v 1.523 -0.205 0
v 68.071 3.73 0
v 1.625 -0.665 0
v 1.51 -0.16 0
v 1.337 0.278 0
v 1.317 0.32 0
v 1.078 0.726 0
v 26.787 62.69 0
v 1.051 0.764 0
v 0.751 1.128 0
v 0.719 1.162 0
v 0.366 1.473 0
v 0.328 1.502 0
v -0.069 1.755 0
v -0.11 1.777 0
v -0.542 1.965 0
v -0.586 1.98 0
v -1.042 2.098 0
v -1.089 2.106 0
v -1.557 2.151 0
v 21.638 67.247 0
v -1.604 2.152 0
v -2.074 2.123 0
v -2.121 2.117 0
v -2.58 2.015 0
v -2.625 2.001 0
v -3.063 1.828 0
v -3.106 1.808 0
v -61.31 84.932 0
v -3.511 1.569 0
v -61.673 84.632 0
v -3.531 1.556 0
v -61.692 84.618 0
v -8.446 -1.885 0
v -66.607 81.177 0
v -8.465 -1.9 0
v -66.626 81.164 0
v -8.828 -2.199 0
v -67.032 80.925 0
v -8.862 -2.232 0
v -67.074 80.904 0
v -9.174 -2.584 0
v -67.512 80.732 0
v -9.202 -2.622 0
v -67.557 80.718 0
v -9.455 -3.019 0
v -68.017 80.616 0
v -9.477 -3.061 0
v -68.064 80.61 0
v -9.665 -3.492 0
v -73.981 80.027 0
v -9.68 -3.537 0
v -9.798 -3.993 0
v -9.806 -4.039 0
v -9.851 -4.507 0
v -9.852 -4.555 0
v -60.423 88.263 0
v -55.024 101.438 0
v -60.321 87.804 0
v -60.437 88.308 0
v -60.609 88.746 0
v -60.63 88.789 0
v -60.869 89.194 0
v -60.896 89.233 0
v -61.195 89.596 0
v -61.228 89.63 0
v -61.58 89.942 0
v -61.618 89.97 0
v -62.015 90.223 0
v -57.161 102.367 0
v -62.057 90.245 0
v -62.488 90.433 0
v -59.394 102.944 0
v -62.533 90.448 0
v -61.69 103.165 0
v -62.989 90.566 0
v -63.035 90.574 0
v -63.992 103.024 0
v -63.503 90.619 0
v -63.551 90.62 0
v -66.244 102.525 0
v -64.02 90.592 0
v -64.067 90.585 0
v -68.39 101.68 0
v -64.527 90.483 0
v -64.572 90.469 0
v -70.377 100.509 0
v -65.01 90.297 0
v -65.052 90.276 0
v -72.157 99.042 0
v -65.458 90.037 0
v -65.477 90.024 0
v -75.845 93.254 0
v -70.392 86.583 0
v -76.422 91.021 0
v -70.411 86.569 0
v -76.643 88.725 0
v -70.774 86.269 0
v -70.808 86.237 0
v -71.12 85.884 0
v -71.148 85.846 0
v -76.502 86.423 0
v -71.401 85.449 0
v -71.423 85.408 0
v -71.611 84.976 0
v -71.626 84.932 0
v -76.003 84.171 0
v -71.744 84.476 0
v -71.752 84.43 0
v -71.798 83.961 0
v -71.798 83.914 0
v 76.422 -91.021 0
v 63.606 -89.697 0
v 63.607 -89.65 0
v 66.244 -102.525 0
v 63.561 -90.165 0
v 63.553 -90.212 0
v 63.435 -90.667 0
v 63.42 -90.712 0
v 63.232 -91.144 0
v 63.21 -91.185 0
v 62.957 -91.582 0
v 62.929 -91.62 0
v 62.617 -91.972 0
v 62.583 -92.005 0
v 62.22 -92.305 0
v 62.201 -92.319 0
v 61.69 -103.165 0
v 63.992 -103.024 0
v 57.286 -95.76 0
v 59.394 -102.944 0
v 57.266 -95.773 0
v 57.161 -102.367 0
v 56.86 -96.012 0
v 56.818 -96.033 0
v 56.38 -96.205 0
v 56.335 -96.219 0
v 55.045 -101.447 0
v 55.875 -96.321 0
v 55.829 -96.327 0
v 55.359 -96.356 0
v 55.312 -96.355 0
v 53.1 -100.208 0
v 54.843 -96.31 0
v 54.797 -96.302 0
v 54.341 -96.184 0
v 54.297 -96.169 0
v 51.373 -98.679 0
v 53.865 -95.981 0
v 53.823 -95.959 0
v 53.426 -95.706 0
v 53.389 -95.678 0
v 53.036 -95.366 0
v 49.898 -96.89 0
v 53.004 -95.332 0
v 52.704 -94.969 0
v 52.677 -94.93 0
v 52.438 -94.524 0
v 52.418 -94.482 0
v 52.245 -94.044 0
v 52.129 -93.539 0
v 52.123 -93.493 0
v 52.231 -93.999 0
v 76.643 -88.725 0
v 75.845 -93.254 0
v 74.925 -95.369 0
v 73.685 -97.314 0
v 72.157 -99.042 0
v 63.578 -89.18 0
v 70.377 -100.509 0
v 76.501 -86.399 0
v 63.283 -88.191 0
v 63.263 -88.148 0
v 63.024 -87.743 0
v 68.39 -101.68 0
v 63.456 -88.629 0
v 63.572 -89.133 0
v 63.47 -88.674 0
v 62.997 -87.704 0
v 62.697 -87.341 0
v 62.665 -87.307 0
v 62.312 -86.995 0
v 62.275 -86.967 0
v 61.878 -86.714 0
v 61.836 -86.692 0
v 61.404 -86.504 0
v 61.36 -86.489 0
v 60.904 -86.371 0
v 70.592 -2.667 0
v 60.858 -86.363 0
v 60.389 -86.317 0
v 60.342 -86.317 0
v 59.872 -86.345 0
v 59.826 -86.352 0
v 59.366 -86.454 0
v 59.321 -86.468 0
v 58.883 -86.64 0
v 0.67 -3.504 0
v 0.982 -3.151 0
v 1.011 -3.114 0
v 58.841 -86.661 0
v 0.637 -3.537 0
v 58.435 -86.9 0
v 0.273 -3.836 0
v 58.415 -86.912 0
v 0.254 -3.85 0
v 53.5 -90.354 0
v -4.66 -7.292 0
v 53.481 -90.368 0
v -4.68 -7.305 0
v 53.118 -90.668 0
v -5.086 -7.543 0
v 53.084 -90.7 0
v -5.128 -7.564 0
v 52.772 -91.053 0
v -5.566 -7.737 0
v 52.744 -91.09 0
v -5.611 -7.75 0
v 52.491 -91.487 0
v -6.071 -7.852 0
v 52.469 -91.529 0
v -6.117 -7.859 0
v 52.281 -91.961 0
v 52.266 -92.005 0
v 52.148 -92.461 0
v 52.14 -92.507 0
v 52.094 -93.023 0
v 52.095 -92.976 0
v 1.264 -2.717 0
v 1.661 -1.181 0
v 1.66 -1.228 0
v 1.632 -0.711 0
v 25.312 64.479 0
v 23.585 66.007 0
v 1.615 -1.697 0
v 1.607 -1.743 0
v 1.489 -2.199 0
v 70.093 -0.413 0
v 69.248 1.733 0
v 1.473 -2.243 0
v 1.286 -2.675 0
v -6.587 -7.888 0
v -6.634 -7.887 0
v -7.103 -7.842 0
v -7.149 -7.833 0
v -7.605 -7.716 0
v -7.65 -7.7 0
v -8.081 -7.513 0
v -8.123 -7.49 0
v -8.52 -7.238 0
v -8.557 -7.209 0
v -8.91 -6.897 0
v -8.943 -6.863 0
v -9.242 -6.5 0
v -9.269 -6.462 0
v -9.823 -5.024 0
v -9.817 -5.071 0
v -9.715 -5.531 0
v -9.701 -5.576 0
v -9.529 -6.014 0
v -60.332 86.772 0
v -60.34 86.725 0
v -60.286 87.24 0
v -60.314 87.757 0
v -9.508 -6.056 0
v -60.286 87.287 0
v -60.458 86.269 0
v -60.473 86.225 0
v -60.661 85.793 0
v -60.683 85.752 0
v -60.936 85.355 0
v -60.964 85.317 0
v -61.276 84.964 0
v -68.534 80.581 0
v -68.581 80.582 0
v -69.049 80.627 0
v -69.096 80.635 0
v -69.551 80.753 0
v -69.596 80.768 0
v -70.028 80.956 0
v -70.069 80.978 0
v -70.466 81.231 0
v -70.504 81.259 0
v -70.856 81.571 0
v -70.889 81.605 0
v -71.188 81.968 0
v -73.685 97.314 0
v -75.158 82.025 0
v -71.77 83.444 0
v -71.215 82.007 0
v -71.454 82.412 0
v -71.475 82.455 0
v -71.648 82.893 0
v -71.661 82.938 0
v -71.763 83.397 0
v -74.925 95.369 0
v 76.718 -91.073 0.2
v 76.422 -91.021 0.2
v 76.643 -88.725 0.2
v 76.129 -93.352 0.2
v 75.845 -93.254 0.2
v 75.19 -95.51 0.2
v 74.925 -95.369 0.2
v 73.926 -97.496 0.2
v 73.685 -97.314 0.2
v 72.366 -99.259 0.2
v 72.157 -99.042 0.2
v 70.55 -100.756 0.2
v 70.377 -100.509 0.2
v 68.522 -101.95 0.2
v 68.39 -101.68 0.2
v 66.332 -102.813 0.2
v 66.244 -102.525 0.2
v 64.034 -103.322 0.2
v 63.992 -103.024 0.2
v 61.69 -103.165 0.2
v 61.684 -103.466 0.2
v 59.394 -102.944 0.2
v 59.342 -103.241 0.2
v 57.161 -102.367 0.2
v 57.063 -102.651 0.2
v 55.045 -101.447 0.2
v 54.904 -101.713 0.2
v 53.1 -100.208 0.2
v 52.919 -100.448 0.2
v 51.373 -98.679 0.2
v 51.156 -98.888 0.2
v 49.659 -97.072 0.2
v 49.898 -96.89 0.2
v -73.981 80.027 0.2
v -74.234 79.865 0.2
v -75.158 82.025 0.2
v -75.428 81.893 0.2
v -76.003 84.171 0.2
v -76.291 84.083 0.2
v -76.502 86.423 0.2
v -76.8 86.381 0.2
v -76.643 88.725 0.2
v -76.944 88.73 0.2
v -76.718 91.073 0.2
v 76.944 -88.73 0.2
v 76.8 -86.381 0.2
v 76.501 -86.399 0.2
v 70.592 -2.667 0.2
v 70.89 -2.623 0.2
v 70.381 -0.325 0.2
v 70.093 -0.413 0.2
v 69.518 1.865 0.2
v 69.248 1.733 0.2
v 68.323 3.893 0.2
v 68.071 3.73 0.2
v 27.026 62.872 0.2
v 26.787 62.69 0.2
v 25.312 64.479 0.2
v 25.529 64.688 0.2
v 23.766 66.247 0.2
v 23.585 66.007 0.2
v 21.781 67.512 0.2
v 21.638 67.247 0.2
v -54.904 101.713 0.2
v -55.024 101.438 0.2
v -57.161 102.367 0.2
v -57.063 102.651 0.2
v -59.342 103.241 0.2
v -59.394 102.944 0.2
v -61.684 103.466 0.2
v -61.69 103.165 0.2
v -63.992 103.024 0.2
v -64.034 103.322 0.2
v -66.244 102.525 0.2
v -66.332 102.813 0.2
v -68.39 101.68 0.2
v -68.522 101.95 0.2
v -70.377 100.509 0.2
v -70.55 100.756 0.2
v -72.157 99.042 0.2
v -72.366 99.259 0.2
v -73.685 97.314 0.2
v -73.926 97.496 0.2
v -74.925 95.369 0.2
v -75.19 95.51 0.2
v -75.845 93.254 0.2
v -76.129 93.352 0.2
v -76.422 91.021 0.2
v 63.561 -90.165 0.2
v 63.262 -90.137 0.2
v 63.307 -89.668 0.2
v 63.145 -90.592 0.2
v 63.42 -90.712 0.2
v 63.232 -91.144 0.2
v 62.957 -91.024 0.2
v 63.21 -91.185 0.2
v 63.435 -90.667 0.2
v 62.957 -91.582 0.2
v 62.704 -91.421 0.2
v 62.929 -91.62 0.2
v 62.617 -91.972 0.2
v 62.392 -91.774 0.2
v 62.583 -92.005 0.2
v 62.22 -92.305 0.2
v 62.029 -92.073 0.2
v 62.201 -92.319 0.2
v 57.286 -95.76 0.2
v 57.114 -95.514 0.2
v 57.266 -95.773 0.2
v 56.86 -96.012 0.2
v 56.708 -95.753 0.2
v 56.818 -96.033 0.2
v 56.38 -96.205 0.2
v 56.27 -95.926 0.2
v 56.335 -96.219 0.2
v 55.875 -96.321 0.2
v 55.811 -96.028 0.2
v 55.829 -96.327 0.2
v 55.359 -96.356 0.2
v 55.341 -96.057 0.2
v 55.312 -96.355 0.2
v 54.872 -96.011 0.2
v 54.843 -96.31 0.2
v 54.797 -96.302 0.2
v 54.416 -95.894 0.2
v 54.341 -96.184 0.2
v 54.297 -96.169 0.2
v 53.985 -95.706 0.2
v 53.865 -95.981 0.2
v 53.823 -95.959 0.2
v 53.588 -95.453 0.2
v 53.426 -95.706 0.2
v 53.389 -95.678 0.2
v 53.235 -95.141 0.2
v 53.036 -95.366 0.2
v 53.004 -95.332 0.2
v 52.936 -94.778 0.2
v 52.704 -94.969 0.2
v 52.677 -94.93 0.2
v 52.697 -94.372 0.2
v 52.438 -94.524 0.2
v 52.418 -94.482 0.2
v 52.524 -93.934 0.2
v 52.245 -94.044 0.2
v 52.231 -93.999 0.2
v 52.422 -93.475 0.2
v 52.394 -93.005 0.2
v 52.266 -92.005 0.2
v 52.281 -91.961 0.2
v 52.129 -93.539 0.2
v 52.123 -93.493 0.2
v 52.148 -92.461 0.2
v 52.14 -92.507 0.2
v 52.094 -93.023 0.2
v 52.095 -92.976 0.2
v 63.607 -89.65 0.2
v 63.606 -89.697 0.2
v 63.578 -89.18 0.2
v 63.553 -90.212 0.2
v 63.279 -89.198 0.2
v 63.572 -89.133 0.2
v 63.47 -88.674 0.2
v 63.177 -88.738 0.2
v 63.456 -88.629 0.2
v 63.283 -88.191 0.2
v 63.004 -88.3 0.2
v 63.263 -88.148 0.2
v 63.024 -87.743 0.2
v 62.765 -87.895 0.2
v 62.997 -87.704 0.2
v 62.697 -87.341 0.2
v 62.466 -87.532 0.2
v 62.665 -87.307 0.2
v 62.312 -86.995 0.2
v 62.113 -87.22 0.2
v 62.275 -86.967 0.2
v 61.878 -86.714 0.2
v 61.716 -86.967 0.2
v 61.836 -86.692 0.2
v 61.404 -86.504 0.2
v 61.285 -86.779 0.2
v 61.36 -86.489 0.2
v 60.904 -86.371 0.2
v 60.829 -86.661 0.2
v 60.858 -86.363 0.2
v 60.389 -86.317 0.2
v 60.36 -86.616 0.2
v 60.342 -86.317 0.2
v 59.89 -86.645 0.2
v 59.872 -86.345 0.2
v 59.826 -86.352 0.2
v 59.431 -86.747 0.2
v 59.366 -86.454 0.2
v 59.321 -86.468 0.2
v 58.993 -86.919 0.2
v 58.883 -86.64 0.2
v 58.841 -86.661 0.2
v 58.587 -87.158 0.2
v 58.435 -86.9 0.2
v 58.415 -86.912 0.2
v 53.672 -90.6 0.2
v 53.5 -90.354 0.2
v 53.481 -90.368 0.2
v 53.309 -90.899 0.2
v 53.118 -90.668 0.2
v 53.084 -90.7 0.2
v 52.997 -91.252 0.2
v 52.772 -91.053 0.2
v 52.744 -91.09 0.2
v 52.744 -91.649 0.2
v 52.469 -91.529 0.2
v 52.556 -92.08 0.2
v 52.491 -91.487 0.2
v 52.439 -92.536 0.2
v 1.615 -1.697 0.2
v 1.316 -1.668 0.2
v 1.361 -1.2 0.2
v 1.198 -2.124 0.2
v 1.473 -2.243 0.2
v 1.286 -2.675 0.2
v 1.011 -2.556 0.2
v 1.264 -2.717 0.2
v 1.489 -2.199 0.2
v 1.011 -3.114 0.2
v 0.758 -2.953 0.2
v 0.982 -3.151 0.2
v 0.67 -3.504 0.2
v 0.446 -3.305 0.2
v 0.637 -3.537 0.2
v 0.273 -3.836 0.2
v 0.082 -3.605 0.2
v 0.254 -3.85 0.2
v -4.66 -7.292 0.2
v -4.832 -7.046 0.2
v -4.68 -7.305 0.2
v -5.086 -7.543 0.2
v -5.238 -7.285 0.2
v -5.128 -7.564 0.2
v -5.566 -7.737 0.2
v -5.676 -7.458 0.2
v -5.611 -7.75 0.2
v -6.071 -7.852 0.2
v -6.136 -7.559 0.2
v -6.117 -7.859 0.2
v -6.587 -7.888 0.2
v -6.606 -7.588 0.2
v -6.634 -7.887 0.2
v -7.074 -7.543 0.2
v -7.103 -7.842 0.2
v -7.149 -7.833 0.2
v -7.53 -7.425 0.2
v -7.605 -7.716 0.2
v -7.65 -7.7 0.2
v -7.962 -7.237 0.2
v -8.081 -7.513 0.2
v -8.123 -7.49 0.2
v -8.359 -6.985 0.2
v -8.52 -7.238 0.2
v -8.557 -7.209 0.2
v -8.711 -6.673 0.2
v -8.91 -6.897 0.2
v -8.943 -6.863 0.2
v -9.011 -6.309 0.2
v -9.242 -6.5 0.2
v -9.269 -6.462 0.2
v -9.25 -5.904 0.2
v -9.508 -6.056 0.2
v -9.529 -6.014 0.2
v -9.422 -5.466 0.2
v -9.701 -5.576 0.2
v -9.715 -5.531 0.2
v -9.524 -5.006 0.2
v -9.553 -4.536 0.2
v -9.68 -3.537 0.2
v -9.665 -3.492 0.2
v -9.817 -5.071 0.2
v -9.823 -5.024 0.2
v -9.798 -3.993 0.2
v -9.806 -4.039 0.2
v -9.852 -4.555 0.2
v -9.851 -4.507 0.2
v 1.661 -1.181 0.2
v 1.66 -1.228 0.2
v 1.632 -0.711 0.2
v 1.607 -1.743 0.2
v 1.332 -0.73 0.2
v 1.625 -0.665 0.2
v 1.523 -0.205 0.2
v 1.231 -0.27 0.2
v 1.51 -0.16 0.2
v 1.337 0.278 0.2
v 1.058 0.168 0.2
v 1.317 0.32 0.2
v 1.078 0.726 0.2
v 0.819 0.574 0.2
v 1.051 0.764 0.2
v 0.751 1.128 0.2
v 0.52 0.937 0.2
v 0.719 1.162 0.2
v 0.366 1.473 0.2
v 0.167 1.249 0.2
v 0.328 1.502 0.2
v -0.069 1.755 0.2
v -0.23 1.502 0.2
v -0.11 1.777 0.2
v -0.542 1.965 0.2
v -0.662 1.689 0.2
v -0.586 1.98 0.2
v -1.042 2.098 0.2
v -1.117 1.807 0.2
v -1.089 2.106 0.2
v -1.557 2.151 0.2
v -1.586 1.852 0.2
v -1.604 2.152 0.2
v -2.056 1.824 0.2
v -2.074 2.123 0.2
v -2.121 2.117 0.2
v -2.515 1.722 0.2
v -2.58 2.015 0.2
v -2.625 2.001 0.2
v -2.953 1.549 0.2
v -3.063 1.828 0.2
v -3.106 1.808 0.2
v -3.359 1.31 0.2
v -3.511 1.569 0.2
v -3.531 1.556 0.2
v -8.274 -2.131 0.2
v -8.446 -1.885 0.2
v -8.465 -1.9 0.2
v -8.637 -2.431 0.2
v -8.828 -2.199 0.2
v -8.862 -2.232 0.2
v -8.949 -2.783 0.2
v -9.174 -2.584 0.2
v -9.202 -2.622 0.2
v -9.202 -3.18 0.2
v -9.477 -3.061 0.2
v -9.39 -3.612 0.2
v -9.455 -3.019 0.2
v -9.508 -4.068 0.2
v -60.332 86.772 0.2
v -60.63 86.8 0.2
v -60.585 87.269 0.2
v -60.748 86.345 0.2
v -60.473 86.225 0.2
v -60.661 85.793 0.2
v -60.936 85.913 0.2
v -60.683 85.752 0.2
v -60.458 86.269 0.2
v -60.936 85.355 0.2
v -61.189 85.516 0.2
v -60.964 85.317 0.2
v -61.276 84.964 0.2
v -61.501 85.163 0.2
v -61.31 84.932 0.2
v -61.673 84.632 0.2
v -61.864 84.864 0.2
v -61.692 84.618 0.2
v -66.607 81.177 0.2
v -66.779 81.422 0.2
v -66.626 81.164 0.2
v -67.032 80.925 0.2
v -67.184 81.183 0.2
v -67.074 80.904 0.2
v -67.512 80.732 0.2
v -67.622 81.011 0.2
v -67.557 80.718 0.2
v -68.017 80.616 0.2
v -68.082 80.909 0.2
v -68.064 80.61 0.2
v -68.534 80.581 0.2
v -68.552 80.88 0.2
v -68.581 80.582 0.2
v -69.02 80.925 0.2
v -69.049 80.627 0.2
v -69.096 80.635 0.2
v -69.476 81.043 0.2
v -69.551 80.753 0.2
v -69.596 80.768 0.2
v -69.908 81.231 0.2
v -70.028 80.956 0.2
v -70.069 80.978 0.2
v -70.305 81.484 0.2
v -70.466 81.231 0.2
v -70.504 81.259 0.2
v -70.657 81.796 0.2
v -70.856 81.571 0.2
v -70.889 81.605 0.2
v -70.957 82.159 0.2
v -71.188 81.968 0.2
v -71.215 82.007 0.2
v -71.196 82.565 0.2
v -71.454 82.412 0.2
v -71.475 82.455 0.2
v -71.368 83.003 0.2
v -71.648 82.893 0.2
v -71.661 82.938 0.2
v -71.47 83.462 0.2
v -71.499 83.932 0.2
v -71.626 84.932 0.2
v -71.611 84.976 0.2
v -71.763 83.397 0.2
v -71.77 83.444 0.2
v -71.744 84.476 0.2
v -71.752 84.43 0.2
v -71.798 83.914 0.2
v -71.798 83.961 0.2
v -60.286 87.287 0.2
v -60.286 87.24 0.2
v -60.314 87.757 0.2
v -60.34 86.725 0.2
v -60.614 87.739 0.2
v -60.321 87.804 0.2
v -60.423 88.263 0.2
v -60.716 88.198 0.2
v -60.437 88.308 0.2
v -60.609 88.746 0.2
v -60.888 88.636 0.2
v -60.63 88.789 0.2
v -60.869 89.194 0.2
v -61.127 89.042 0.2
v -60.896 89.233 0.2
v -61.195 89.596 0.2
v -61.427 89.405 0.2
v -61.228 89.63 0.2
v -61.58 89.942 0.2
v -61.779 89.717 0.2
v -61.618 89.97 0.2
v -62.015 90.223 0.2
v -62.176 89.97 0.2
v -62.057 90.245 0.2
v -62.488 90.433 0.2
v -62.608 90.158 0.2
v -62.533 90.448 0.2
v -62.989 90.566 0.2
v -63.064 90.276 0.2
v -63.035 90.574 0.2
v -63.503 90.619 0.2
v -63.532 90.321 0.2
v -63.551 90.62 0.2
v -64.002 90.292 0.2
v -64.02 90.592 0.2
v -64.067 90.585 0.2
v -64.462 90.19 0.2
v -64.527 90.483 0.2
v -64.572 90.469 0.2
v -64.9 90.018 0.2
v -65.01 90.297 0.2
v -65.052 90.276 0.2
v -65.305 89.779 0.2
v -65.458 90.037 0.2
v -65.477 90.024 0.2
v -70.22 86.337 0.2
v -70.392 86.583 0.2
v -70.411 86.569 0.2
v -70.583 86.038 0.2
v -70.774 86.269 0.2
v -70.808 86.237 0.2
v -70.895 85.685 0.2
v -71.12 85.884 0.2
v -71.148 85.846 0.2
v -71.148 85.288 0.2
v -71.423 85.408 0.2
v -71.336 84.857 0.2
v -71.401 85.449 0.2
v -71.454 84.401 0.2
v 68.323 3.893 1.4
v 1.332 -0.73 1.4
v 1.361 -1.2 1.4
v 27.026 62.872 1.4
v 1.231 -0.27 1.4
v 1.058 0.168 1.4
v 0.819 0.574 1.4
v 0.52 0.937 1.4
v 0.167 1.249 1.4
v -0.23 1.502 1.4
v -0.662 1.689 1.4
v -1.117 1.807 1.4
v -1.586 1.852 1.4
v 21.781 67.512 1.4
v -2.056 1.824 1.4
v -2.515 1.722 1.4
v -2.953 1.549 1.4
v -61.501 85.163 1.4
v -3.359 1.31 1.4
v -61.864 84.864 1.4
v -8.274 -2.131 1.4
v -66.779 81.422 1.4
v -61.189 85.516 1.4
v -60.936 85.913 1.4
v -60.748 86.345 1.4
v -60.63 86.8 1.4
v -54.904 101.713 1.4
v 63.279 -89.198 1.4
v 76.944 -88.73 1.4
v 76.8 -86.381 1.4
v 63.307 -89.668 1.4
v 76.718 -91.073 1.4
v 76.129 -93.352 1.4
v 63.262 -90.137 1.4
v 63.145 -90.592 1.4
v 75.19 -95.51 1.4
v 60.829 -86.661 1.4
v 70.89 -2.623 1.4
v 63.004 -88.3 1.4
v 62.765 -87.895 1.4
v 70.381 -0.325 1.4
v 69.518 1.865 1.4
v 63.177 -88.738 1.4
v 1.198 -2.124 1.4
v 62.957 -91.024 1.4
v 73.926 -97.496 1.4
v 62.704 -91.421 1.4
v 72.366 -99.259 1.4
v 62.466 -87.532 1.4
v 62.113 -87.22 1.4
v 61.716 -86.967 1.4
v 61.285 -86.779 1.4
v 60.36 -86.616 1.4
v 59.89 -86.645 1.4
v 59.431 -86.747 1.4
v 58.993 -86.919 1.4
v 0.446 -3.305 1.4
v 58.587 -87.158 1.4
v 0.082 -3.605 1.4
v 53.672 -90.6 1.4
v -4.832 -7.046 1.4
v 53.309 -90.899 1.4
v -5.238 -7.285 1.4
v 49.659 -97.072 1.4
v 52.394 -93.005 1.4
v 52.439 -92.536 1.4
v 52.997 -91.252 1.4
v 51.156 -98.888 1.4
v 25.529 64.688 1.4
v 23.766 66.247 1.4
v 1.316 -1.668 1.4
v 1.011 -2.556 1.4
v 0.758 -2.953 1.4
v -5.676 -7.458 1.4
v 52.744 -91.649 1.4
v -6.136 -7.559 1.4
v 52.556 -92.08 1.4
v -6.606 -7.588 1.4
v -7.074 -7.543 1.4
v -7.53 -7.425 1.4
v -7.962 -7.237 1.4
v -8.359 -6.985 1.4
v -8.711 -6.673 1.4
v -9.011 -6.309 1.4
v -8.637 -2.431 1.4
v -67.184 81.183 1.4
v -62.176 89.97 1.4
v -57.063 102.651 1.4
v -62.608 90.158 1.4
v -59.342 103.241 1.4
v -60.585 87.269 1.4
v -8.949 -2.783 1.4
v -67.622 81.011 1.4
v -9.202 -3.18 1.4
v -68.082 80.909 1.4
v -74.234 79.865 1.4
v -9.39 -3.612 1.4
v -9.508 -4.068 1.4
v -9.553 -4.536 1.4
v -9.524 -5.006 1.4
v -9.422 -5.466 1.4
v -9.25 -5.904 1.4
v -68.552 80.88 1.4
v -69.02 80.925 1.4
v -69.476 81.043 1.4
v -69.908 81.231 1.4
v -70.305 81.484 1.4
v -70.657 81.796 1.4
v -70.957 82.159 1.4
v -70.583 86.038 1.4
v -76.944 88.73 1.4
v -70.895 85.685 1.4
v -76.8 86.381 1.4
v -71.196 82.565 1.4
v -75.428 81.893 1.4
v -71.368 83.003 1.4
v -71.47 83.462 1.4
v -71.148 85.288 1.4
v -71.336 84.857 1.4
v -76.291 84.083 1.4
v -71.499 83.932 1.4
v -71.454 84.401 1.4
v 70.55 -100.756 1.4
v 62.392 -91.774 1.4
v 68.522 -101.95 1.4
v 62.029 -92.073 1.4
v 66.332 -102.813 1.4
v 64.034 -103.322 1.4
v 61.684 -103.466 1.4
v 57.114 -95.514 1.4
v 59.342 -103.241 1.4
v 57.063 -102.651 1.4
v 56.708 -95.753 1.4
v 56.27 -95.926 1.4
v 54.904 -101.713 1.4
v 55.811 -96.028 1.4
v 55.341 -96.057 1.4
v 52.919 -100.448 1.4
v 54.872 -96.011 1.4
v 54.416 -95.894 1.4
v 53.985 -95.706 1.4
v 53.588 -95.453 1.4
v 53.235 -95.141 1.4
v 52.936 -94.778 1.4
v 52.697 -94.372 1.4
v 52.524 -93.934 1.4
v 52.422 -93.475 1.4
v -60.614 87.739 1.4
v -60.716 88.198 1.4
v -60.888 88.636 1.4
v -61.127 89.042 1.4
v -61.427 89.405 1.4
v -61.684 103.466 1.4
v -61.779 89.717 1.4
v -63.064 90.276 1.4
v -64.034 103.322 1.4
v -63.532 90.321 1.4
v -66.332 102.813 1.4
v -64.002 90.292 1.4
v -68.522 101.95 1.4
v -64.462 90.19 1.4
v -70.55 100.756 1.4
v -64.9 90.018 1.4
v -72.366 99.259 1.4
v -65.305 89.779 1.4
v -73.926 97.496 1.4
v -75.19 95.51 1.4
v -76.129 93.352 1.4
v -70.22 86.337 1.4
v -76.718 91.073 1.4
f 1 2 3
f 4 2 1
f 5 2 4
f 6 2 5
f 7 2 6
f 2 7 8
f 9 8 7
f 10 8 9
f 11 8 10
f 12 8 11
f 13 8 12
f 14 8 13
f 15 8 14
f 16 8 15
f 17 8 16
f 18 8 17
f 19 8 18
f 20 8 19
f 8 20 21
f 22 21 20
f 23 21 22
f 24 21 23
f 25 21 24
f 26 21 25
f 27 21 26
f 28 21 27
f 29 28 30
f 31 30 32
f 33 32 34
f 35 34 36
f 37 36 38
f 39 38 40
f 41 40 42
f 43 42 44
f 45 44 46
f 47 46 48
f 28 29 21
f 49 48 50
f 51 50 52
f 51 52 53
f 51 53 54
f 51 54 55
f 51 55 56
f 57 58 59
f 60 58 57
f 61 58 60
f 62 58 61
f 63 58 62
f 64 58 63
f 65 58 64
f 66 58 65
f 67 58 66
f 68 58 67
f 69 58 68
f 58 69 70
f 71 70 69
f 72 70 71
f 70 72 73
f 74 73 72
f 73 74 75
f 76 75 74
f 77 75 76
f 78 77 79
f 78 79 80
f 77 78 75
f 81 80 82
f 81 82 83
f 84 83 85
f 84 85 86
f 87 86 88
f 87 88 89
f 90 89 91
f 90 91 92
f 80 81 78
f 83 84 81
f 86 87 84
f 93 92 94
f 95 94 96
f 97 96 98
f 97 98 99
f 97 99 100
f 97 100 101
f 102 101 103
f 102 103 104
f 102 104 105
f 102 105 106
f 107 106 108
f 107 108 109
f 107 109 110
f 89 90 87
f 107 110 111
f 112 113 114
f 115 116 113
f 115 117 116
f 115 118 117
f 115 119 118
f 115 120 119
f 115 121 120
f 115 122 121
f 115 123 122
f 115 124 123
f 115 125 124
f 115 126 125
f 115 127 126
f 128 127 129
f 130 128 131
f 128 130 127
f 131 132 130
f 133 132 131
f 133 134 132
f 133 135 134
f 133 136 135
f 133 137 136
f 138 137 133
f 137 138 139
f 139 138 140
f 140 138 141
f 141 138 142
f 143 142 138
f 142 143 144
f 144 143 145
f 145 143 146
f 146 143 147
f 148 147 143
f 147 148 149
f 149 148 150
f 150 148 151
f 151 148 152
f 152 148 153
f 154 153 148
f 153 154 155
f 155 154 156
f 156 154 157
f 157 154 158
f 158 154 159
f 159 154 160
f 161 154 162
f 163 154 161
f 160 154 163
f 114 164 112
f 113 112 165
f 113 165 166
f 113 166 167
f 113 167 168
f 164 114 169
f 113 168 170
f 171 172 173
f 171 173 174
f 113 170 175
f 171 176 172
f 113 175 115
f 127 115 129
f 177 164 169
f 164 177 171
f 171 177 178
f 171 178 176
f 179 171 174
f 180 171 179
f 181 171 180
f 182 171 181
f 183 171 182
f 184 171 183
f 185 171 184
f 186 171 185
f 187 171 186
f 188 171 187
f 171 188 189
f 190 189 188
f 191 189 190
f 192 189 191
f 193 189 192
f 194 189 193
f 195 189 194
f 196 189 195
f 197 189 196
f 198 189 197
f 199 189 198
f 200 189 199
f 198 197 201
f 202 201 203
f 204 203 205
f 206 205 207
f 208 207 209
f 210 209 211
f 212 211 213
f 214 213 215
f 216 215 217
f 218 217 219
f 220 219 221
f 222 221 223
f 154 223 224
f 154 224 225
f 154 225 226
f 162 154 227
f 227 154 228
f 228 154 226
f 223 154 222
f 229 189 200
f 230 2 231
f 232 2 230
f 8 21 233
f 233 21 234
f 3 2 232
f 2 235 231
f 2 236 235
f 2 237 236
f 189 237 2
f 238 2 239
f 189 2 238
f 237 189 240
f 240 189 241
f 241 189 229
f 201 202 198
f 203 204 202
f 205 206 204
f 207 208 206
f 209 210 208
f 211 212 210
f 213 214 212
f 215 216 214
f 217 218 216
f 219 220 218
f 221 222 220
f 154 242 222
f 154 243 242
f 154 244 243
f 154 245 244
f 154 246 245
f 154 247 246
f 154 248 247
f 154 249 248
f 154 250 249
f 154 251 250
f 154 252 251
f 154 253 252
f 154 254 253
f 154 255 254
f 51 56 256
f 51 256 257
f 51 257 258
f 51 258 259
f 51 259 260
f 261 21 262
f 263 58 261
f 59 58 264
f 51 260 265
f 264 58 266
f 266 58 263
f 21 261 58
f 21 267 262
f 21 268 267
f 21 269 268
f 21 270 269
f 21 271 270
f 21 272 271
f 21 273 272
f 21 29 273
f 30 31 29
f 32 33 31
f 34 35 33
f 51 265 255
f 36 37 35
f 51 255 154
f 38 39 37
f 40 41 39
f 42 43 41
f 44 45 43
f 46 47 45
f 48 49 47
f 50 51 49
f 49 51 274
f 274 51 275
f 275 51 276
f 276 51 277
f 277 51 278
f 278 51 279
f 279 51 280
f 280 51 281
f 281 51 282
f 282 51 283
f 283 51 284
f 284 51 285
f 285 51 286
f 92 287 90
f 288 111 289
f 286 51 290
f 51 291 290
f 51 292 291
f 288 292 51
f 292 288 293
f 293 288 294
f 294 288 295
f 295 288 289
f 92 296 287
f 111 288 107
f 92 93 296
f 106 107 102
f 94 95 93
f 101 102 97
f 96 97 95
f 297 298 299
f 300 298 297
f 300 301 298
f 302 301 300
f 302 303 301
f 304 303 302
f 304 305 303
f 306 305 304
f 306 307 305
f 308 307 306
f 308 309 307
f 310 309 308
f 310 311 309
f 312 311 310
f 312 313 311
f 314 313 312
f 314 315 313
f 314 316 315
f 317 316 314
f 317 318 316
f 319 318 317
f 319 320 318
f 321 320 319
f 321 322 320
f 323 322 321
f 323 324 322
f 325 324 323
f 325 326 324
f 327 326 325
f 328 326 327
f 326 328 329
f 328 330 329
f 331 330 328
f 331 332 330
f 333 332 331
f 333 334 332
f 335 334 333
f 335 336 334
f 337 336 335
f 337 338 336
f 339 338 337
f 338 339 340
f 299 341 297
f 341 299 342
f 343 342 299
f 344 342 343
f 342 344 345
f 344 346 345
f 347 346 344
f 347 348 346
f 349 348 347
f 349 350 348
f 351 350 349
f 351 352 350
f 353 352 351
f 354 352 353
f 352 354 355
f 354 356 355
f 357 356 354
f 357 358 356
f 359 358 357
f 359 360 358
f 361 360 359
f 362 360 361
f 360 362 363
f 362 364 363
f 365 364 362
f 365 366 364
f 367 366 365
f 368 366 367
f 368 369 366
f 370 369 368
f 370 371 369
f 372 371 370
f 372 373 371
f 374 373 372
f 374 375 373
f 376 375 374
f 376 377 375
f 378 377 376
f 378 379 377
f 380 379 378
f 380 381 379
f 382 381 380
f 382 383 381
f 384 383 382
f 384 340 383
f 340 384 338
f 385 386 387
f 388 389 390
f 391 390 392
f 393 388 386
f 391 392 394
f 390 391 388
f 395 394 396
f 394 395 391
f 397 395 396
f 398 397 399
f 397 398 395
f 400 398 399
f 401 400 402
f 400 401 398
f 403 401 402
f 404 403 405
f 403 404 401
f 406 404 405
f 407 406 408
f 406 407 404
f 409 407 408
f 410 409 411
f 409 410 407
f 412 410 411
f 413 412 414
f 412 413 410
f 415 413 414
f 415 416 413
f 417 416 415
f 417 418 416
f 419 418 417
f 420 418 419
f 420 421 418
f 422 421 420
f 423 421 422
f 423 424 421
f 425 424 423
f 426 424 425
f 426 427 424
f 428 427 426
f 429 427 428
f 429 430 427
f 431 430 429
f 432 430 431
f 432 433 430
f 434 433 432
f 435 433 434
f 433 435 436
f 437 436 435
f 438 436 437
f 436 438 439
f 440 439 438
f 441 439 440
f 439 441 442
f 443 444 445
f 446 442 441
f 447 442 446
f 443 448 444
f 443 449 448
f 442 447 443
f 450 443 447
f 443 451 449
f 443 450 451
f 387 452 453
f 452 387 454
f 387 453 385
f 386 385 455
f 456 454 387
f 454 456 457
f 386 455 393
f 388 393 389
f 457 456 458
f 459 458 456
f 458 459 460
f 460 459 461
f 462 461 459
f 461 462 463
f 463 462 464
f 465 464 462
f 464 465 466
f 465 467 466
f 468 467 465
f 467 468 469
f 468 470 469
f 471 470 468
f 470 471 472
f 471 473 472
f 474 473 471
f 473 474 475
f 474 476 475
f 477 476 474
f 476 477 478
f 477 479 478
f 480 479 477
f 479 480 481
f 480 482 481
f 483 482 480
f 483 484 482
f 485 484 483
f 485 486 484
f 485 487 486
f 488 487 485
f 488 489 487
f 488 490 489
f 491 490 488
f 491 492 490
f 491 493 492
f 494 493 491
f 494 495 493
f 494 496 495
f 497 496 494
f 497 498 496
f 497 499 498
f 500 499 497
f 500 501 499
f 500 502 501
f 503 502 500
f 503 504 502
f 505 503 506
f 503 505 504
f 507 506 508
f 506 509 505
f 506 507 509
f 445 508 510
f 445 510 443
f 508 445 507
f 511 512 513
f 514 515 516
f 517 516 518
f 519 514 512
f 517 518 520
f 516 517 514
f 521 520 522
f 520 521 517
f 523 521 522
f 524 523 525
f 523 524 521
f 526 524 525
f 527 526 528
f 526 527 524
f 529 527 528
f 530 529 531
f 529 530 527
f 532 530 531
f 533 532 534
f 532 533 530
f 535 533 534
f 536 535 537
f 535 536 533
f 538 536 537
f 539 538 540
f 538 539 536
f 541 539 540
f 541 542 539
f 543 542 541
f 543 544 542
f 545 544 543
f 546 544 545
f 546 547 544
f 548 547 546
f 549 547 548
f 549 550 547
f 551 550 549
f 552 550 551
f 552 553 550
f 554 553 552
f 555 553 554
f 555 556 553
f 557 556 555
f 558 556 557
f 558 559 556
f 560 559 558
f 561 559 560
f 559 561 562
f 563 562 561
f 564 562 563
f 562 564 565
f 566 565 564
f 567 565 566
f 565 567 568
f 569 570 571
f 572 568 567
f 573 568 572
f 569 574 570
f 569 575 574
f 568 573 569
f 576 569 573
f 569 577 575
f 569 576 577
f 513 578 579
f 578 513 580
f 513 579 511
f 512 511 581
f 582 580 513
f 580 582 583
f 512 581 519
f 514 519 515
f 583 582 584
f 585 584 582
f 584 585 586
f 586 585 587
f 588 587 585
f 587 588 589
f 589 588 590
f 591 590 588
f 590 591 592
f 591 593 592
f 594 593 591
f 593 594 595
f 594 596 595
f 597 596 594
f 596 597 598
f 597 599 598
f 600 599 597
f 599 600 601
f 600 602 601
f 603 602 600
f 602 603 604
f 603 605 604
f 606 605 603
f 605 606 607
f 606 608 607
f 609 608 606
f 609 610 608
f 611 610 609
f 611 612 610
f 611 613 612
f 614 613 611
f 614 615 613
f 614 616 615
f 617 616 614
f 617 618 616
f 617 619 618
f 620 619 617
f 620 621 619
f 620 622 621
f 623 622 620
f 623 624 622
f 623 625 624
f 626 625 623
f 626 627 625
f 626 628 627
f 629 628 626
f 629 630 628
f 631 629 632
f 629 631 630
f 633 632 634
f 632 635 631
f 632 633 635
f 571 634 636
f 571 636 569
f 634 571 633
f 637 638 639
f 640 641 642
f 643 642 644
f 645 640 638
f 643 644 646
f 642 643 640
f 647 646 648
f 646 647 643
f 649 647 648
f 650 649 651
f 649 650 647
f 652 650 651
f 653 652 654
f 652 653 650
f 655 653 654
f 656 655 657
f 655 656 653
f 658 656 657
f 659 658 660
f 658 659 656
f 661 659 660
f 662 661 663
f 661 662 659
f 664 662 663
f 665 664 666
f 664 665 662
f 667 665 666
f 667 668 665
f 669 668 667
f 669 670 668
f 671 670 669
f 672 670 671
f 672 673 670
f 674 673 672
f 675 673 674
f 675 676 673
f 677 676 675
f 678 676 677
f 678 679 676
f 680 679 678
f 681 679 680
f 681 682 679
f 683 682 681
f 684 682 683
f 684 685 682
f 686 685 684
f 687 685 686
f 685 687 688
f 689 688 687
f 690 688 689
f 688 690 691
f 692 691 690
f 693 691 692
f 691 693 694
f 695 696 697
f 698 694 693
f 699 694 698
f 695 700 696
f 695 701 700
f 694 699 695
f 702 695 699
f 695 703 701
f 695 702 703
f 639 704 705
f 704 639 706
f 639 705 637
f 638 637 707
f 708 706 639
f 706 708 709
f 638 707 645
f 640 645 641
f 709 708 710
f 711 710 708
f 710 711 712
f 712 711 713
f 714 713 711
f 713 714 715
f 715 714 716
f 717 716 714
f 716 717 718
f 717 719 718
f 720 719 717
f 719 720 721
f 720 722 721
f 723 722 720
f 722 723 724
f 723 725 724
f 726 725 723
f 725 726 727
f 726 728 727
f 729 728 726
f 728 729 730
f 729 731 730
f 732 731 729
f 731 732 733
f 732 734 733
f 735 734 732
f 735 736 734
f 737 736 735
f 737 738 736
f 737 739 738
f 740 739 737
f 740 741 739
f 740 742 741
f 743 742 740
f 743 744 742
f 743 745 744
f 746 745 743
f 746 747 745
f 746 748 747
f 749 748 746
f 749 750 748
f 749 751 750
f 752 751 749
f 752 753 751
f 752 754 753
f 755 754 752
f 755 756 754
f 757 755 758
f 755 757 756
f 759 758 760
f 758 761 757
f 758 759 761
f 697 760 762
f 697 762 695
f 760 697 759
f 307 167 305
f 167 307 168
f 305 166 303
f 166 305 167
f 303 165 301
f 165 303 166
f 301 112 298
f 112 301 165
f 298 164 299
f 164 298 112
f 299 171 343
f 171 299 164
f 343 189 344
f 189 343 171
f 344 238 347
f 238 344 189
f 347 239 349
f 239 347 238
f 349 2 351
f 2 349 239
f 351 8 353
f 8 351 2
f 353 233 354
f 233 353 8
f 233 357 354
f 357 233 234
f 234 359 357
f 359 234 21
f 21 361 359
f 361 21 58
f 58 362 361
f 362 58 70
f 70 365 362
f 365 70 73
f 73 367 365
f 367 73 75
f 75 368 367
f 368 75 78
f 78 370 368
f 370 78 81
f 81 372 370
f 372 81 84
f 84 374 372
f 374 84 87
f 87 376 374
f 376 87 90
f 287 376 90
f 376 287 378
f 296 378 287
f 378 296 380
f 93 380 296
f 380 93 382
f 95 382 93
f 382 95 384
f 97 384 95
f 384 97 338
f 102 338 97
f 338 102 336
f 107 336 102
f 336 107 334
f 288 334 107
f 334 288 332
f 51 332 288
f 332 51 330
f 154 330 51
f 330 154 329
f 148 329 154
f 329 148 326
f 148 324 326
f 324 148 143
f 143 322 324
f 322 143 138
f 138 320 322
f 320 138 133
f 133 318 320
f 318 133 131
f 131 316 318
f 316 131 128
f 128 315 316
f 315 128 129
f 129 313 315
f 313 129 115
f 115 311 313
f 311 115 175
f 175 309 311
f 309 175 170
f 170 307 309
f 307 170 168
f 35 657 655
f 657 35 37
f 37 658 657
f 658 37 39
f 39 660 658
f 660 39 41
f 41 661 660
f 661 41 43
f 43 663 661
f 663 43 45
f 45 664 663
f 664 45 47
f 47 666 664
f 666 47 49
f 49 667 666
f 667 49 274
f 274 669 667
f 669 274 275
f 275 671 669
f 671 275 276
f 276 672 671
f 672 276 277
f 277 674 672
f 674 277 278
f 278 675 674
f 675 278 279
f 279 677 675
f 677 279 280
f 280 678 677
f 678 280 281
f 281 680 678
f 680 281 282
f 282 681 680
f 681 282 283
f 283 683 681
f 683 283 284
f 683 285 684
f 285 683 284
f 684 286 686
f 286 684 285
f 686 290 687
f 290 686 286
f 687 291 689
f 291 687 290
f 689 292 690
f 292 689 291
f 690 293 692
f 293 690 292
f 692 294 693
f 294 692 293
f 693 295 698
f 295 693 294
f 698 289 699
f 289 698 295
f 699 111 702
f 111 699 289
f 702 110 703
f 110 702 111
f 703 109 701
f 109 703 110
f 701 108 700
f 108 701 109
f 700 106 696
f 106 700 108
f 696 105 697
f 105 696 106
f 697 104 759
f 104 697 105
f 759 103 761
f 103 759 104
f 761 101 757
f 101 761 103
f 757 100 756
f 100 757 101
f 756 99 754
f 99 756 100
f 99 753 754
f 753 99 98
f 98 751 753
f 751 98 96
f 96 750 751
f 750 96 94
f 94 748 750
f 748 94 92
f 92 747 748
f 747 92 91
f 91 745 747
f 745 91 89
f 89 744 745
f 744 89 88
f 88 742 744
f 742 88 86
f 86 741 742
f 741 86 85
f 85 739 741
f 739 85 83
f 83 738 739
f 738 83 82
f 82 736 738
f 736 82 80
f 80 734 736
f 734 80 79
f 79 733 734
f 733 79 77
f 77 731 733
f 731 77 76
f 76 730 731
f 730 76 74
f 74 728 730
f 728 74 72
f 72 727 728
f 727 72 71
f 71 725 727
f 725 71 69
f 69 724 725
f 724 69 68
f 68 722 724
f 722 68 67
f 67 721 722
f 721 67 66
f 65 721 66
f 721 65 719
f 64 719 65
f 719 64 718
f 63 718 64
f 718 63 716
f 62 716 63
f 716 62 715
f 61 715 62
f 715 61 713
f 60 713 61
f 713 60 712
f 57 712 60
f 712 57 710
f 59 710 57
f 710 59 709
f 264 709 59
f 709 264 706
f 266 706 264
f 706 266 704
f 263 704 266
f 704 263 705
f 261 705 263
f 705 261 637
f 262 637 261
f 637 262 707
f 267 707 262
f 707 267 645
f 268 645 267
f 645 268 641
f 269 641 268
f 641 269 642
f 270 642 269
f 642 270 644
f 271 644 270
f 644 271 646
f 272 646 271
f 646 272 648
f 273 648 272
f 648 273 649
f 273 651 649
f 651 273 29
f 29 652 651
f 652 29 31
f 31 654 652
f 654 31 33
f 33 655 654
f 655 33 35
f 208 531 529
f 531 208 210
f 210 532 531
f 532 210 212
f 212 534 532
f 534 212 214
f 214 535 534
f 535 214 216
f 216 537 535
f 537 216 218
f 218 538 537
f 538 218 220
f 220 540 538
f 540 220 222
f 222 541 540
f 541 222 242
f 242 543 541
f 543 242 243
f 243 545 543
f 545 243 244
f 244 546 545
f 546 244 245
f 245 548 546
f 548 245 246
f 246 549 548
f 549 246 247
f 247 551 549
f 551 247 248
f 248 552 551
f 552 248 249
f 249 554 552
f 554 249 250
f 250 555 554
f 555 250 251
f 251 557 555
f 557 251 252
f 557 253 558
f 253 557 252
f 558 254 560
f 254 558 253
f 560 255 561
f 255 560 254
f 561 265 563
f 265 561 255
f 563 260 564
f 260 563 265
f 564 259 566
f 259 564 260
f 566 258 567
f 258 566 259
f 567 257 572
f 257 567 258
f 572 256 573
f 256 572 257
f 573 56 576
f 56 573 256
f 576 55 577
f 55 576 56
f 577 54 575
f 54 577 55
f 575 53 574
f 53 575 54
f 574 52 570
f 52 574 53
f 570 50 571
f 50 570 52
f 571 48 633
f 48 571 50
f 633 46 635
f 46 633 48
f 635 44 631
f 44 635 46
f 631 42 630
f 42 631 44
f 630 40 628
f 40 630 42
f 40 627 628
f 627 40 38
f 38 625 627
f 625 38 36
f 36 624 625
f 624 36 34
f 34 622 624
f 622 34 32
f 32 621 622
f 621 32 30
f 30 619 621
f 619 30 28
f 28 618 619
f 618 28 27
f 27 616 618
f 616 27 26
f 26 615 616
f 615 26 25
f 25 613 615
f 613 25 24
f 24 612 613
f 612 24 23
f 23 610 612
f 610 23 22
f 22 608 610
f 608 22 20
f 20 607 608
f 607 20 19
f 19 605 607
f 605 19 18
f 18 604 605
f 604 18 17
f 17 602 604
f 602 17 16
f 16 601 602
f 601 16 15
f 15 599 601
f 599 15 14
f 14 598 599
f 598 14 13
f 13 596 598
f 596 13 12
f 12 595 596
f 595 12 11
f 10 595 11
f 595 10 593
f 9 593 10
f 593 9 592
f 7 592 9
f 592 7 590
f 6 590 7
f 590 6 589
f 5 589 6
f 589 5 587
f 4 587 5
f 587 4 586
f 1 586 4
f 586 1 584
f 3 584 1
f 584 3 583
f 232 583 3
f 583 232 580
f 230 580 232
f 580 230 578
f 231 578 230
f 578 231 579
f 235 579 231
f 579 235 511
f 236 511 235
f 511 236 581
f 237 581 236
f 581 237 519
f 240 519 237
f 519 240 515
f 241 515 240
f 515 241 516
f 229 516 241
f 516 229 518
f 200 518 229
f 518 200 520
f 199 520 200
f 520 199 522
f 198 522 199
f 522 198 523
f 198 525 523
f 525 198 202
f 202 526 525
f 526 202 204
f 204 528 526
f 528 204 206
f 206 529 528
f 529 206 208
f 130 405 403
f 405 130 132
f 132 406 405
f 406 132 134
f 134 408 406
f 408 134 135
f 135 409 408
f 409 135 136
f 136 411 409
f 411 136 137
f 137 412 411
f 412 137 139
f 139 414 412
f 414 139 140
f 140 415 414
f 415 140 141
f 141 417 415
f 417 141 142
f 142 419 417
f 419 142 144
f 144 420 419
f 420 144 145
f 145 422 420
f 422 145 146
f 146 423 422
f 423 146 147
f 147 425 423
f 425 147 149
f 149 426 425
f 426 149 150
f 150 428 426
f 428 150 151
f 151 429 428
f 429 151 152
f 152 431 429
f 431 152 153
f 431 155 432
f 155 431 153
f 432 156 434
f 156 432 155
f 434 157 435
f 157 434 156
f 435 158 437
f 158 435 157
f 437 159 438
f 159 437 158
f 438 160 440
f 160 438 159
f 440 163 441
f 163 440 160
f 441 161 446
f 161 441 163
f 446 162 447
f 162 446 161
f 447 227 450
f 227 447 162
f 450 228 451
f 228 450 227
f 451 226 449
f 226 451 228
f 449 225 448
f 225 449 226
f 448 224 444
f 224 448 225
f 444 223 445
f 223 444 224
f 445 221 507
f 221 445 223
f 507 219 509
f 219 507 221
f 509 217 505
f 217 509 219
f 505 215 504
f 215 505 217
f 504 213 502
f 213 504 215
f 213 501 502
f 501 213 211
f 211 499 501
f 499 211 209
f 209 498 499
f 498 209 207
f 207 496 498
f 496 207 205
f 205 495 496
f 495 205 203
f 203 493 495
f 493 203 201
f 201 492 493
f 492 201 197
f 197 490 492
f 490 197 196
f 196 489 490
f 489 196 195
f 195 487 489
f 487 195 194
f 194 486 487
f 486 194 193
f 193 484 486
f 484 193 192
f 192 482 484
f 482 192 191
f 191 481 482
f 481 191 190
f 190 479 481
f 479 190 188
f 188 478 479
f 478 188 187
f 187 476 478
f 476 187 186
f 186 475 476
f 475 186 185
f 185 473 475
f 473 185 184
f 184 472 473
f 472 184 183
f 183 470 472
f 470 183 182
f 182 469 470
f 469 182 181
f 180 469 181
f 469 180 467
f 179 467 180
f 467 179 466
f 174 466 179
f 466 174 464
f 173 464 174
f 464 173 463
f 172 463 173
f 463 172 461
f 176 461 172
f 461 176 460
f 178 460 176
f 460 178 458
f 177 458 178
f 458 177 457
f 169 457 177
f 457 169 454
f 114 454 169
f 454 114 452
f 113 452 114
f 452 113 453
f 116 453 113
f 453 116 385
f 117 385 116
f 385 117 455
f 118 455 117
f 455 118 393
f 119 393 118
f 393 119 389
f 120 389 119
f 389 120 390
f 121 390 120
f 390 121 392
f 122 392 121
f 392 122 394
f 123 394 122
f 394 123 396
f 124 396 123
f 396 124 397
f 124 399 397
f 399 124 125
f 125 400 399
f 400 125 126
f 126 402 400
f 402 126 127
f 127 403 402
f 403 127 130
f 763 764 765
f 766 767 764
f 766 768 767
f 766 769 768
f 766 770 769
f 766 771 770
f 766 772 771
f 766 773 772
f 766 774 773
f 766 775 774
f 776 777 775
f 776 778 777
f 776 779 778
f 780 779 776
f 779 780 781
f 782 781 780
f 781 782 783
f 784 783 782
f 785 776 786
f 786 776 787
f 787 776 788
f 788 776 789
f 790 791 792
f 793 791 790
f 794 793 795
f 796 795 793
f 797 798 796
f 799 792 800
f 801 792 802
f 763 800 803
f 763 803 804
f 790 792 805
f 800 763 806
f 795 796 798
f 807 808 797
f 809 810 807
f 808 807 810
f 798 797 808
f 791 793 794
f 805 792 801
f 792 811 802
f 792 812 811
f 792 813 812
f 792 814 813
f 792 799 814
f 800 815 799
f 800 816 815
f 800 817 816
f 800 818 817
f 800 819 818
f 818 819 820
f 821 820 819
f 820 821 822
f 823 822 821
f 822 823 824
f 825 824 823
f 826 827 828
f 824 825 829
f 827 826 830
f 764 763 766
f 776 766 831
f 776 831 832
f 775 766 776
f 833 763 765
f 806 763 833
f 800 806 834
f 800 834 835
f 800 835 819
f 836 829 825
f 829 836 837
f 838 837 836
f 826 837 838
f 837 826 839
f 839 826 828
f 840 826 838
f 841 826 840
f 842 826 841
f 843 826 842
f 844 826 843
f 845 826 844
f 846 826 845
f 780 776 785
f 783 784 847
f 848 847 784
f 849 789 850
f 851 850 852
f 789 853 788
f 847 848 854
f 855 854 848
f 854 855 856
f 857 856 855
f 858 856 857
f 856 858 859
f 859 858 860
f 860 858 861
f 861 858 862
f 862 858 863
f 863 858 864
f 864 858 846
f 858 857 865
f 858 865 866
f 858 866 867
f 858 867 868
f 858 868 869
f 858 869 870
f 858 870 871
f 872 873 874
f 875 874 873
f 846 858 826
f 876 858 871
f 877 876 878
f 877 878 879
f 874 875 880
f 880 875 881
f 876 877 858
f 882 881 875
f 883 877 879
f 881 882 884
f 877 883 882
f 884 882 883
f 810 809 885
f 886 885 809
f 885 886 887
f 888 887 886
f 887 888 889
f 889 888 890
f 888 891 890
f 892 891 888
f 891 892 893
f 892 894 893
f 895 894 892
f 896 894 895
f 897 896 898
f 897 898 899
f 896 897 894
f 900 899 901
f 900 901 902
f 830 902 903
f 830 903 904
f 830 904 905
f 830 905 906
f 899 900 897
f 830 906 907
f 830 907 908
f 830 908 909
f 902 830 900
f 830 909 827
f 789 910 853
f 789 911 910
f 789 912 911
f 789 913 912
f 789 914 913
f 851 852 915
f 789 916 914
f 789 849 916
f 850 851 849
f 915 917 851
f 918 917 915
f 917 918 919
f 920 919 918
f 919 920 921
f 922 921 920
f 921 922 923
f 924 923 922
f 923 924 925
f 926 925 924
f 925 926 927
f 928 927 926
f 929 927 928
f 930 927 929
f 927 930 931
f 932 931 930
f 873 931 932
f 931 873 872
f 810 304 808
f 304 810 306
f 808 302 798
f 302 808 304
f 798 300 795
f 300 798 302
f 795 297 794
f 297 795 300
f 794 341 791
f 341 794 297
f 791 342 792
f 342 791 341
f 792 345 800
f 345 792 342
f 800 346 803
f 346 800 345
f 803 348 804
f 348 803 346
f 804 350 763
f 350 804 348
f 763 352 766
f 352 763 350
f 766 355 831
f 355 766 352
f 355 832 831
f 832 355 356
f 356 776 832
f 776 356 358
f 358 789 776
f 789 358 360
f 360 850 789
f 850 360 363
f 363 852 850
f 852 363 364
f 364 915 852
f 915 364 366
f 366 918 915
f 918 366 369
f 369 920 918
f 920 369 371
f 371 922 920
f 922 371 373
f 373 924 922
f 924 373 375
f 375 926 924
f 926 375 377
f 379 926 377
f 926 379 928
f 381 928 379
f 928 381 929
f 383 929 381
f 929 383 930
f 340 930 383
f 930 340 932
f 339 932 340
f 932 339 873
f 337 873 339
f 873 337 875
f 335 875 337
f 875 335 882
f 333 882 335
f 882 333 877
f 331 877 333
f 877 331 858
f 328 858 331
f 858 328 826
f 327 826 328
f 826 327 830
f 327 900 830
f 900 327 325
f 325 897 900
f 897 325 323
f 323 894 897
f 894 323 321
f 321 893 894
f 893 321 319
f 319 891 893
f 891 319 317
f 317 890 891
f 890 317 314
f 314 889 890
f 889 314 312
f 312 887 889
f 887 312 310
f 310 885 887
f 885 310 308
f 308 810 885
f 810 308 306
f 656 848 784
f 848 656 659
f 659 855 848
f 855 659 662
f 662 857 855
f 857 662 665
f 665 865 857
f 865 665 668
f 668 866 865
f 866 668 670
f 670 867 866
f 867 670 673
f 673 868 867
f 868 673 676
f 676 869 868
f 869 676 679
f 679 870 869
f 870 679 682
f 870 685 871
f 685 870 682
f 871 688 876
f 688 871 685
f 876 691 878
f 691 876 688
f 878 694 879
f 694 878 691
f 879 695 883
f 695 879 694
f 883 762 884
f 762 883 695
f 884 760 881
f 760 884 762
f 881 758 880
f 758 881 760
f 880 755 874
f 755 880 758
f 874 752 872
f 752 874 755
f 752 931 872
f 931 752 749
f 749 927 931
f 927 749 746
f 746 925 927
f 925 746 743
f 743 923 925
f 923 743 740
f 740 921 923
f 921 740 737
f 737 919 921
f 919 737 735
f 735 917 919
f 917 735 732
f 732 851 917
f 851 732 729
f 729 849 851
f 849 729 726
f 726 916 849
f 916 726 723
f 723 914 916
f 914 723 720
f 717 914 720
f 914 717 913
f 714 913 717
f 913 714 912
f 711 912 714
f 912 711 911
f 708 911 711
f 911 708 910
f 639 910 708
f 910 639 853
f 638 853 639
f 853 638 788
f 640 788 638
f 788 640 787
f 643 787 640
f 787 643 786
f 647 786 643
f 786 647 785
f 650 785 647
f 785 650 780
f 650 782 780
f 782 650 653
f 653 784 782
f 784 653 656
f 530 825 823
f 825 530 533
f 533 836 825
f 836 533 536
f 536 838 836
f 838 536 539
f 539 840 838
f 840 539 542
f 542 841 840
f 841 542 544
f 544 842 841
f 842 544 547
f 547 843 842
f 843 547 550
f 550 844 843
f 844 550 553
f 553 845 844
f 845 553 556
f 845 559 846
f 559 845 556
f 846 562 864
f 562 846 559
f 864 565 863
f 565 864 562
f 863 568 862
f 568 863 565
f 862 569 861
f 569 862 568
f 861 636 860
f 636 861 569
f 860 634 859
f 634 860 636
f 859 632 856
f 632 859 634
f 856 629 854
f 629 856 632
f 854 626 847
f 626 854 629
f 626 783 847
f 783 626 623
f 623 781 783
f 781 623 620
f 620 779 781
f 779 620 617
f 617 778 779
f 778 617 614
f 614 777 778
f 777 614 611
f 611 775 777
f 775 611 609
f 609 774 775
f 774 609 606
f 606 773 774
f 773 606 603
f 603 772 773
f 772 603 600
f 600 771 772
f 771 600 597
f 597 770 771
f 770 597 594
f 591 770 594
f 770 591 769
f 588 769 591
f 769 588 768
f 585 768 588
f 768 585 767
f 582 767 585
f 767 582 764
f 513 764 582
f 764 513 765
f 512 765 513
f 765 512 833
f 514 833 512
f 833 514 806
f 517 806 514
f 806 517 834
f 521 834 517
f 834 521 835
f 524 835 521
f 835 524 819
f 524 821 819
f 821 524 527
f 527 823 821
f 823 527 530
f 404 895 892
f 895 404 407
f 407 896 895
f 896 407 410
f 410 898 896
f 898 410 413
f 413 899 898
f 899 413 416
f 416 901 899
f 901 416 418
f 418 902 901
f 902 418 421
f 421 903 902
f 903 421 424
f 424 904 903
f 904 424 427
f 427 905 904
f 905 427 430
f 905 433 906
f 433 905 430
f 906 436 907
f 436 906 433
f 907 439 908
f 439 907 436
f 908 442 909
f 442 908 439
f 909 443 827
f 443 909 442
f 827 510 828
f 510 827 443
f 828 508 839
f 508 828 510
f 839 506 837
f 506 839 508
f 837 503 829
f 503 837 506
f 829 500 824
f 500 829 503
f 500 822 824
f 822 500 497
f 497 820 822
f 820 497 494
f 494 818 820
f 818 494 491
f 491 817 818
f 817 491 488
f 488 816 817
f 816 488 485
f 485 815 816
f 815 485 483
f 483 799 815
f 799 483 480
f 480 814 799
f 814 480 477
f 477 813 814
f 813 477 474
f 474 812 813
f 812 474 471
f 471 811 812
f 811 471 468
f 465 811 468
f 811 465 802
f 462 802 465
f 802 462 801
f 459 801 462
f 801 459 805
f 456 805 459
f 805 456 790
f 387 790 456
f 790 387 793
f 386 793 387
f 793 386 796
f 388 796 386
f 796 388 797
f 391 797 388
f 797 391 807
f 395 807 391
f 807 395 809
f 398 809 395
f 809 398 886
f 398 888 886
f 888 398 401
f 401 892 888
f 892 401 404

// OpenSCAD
// Use 0.2mm layers.

hole_spacing = 216;
$fn = 40;
height = 1.4;

module exterior_2d() {
  diam = 30;
  
  hull() {
    for (a = [-1, 1]) {
      translate([0, a*hole_spacing/2])
        circle(d=diam);
      
      translate([hole_spacing/5, a*hole_spacing/6])
        circle(d=diam);
    }
  }
}

module holes_2d() {
  for (a = [-1, 0, 1])
    translate([0, a*hole_spacing/2])
      hull()
        for (b = [-1, 0])
          translate([b*6-2, 0])
            circle(d=6);
}

module profile_2d() {
  difference() {
    exterior_2d();
    holes_2d();
  }
}

module main() {
  rotate([0, 0, 35]) {
    linear_extrude(0.2)
      offset(-0.3)
        profile_2d();
    translate([0, 0, 0.2])
      linear_extrude(height-0.2)
        profile_2d();
  }
}

main();
